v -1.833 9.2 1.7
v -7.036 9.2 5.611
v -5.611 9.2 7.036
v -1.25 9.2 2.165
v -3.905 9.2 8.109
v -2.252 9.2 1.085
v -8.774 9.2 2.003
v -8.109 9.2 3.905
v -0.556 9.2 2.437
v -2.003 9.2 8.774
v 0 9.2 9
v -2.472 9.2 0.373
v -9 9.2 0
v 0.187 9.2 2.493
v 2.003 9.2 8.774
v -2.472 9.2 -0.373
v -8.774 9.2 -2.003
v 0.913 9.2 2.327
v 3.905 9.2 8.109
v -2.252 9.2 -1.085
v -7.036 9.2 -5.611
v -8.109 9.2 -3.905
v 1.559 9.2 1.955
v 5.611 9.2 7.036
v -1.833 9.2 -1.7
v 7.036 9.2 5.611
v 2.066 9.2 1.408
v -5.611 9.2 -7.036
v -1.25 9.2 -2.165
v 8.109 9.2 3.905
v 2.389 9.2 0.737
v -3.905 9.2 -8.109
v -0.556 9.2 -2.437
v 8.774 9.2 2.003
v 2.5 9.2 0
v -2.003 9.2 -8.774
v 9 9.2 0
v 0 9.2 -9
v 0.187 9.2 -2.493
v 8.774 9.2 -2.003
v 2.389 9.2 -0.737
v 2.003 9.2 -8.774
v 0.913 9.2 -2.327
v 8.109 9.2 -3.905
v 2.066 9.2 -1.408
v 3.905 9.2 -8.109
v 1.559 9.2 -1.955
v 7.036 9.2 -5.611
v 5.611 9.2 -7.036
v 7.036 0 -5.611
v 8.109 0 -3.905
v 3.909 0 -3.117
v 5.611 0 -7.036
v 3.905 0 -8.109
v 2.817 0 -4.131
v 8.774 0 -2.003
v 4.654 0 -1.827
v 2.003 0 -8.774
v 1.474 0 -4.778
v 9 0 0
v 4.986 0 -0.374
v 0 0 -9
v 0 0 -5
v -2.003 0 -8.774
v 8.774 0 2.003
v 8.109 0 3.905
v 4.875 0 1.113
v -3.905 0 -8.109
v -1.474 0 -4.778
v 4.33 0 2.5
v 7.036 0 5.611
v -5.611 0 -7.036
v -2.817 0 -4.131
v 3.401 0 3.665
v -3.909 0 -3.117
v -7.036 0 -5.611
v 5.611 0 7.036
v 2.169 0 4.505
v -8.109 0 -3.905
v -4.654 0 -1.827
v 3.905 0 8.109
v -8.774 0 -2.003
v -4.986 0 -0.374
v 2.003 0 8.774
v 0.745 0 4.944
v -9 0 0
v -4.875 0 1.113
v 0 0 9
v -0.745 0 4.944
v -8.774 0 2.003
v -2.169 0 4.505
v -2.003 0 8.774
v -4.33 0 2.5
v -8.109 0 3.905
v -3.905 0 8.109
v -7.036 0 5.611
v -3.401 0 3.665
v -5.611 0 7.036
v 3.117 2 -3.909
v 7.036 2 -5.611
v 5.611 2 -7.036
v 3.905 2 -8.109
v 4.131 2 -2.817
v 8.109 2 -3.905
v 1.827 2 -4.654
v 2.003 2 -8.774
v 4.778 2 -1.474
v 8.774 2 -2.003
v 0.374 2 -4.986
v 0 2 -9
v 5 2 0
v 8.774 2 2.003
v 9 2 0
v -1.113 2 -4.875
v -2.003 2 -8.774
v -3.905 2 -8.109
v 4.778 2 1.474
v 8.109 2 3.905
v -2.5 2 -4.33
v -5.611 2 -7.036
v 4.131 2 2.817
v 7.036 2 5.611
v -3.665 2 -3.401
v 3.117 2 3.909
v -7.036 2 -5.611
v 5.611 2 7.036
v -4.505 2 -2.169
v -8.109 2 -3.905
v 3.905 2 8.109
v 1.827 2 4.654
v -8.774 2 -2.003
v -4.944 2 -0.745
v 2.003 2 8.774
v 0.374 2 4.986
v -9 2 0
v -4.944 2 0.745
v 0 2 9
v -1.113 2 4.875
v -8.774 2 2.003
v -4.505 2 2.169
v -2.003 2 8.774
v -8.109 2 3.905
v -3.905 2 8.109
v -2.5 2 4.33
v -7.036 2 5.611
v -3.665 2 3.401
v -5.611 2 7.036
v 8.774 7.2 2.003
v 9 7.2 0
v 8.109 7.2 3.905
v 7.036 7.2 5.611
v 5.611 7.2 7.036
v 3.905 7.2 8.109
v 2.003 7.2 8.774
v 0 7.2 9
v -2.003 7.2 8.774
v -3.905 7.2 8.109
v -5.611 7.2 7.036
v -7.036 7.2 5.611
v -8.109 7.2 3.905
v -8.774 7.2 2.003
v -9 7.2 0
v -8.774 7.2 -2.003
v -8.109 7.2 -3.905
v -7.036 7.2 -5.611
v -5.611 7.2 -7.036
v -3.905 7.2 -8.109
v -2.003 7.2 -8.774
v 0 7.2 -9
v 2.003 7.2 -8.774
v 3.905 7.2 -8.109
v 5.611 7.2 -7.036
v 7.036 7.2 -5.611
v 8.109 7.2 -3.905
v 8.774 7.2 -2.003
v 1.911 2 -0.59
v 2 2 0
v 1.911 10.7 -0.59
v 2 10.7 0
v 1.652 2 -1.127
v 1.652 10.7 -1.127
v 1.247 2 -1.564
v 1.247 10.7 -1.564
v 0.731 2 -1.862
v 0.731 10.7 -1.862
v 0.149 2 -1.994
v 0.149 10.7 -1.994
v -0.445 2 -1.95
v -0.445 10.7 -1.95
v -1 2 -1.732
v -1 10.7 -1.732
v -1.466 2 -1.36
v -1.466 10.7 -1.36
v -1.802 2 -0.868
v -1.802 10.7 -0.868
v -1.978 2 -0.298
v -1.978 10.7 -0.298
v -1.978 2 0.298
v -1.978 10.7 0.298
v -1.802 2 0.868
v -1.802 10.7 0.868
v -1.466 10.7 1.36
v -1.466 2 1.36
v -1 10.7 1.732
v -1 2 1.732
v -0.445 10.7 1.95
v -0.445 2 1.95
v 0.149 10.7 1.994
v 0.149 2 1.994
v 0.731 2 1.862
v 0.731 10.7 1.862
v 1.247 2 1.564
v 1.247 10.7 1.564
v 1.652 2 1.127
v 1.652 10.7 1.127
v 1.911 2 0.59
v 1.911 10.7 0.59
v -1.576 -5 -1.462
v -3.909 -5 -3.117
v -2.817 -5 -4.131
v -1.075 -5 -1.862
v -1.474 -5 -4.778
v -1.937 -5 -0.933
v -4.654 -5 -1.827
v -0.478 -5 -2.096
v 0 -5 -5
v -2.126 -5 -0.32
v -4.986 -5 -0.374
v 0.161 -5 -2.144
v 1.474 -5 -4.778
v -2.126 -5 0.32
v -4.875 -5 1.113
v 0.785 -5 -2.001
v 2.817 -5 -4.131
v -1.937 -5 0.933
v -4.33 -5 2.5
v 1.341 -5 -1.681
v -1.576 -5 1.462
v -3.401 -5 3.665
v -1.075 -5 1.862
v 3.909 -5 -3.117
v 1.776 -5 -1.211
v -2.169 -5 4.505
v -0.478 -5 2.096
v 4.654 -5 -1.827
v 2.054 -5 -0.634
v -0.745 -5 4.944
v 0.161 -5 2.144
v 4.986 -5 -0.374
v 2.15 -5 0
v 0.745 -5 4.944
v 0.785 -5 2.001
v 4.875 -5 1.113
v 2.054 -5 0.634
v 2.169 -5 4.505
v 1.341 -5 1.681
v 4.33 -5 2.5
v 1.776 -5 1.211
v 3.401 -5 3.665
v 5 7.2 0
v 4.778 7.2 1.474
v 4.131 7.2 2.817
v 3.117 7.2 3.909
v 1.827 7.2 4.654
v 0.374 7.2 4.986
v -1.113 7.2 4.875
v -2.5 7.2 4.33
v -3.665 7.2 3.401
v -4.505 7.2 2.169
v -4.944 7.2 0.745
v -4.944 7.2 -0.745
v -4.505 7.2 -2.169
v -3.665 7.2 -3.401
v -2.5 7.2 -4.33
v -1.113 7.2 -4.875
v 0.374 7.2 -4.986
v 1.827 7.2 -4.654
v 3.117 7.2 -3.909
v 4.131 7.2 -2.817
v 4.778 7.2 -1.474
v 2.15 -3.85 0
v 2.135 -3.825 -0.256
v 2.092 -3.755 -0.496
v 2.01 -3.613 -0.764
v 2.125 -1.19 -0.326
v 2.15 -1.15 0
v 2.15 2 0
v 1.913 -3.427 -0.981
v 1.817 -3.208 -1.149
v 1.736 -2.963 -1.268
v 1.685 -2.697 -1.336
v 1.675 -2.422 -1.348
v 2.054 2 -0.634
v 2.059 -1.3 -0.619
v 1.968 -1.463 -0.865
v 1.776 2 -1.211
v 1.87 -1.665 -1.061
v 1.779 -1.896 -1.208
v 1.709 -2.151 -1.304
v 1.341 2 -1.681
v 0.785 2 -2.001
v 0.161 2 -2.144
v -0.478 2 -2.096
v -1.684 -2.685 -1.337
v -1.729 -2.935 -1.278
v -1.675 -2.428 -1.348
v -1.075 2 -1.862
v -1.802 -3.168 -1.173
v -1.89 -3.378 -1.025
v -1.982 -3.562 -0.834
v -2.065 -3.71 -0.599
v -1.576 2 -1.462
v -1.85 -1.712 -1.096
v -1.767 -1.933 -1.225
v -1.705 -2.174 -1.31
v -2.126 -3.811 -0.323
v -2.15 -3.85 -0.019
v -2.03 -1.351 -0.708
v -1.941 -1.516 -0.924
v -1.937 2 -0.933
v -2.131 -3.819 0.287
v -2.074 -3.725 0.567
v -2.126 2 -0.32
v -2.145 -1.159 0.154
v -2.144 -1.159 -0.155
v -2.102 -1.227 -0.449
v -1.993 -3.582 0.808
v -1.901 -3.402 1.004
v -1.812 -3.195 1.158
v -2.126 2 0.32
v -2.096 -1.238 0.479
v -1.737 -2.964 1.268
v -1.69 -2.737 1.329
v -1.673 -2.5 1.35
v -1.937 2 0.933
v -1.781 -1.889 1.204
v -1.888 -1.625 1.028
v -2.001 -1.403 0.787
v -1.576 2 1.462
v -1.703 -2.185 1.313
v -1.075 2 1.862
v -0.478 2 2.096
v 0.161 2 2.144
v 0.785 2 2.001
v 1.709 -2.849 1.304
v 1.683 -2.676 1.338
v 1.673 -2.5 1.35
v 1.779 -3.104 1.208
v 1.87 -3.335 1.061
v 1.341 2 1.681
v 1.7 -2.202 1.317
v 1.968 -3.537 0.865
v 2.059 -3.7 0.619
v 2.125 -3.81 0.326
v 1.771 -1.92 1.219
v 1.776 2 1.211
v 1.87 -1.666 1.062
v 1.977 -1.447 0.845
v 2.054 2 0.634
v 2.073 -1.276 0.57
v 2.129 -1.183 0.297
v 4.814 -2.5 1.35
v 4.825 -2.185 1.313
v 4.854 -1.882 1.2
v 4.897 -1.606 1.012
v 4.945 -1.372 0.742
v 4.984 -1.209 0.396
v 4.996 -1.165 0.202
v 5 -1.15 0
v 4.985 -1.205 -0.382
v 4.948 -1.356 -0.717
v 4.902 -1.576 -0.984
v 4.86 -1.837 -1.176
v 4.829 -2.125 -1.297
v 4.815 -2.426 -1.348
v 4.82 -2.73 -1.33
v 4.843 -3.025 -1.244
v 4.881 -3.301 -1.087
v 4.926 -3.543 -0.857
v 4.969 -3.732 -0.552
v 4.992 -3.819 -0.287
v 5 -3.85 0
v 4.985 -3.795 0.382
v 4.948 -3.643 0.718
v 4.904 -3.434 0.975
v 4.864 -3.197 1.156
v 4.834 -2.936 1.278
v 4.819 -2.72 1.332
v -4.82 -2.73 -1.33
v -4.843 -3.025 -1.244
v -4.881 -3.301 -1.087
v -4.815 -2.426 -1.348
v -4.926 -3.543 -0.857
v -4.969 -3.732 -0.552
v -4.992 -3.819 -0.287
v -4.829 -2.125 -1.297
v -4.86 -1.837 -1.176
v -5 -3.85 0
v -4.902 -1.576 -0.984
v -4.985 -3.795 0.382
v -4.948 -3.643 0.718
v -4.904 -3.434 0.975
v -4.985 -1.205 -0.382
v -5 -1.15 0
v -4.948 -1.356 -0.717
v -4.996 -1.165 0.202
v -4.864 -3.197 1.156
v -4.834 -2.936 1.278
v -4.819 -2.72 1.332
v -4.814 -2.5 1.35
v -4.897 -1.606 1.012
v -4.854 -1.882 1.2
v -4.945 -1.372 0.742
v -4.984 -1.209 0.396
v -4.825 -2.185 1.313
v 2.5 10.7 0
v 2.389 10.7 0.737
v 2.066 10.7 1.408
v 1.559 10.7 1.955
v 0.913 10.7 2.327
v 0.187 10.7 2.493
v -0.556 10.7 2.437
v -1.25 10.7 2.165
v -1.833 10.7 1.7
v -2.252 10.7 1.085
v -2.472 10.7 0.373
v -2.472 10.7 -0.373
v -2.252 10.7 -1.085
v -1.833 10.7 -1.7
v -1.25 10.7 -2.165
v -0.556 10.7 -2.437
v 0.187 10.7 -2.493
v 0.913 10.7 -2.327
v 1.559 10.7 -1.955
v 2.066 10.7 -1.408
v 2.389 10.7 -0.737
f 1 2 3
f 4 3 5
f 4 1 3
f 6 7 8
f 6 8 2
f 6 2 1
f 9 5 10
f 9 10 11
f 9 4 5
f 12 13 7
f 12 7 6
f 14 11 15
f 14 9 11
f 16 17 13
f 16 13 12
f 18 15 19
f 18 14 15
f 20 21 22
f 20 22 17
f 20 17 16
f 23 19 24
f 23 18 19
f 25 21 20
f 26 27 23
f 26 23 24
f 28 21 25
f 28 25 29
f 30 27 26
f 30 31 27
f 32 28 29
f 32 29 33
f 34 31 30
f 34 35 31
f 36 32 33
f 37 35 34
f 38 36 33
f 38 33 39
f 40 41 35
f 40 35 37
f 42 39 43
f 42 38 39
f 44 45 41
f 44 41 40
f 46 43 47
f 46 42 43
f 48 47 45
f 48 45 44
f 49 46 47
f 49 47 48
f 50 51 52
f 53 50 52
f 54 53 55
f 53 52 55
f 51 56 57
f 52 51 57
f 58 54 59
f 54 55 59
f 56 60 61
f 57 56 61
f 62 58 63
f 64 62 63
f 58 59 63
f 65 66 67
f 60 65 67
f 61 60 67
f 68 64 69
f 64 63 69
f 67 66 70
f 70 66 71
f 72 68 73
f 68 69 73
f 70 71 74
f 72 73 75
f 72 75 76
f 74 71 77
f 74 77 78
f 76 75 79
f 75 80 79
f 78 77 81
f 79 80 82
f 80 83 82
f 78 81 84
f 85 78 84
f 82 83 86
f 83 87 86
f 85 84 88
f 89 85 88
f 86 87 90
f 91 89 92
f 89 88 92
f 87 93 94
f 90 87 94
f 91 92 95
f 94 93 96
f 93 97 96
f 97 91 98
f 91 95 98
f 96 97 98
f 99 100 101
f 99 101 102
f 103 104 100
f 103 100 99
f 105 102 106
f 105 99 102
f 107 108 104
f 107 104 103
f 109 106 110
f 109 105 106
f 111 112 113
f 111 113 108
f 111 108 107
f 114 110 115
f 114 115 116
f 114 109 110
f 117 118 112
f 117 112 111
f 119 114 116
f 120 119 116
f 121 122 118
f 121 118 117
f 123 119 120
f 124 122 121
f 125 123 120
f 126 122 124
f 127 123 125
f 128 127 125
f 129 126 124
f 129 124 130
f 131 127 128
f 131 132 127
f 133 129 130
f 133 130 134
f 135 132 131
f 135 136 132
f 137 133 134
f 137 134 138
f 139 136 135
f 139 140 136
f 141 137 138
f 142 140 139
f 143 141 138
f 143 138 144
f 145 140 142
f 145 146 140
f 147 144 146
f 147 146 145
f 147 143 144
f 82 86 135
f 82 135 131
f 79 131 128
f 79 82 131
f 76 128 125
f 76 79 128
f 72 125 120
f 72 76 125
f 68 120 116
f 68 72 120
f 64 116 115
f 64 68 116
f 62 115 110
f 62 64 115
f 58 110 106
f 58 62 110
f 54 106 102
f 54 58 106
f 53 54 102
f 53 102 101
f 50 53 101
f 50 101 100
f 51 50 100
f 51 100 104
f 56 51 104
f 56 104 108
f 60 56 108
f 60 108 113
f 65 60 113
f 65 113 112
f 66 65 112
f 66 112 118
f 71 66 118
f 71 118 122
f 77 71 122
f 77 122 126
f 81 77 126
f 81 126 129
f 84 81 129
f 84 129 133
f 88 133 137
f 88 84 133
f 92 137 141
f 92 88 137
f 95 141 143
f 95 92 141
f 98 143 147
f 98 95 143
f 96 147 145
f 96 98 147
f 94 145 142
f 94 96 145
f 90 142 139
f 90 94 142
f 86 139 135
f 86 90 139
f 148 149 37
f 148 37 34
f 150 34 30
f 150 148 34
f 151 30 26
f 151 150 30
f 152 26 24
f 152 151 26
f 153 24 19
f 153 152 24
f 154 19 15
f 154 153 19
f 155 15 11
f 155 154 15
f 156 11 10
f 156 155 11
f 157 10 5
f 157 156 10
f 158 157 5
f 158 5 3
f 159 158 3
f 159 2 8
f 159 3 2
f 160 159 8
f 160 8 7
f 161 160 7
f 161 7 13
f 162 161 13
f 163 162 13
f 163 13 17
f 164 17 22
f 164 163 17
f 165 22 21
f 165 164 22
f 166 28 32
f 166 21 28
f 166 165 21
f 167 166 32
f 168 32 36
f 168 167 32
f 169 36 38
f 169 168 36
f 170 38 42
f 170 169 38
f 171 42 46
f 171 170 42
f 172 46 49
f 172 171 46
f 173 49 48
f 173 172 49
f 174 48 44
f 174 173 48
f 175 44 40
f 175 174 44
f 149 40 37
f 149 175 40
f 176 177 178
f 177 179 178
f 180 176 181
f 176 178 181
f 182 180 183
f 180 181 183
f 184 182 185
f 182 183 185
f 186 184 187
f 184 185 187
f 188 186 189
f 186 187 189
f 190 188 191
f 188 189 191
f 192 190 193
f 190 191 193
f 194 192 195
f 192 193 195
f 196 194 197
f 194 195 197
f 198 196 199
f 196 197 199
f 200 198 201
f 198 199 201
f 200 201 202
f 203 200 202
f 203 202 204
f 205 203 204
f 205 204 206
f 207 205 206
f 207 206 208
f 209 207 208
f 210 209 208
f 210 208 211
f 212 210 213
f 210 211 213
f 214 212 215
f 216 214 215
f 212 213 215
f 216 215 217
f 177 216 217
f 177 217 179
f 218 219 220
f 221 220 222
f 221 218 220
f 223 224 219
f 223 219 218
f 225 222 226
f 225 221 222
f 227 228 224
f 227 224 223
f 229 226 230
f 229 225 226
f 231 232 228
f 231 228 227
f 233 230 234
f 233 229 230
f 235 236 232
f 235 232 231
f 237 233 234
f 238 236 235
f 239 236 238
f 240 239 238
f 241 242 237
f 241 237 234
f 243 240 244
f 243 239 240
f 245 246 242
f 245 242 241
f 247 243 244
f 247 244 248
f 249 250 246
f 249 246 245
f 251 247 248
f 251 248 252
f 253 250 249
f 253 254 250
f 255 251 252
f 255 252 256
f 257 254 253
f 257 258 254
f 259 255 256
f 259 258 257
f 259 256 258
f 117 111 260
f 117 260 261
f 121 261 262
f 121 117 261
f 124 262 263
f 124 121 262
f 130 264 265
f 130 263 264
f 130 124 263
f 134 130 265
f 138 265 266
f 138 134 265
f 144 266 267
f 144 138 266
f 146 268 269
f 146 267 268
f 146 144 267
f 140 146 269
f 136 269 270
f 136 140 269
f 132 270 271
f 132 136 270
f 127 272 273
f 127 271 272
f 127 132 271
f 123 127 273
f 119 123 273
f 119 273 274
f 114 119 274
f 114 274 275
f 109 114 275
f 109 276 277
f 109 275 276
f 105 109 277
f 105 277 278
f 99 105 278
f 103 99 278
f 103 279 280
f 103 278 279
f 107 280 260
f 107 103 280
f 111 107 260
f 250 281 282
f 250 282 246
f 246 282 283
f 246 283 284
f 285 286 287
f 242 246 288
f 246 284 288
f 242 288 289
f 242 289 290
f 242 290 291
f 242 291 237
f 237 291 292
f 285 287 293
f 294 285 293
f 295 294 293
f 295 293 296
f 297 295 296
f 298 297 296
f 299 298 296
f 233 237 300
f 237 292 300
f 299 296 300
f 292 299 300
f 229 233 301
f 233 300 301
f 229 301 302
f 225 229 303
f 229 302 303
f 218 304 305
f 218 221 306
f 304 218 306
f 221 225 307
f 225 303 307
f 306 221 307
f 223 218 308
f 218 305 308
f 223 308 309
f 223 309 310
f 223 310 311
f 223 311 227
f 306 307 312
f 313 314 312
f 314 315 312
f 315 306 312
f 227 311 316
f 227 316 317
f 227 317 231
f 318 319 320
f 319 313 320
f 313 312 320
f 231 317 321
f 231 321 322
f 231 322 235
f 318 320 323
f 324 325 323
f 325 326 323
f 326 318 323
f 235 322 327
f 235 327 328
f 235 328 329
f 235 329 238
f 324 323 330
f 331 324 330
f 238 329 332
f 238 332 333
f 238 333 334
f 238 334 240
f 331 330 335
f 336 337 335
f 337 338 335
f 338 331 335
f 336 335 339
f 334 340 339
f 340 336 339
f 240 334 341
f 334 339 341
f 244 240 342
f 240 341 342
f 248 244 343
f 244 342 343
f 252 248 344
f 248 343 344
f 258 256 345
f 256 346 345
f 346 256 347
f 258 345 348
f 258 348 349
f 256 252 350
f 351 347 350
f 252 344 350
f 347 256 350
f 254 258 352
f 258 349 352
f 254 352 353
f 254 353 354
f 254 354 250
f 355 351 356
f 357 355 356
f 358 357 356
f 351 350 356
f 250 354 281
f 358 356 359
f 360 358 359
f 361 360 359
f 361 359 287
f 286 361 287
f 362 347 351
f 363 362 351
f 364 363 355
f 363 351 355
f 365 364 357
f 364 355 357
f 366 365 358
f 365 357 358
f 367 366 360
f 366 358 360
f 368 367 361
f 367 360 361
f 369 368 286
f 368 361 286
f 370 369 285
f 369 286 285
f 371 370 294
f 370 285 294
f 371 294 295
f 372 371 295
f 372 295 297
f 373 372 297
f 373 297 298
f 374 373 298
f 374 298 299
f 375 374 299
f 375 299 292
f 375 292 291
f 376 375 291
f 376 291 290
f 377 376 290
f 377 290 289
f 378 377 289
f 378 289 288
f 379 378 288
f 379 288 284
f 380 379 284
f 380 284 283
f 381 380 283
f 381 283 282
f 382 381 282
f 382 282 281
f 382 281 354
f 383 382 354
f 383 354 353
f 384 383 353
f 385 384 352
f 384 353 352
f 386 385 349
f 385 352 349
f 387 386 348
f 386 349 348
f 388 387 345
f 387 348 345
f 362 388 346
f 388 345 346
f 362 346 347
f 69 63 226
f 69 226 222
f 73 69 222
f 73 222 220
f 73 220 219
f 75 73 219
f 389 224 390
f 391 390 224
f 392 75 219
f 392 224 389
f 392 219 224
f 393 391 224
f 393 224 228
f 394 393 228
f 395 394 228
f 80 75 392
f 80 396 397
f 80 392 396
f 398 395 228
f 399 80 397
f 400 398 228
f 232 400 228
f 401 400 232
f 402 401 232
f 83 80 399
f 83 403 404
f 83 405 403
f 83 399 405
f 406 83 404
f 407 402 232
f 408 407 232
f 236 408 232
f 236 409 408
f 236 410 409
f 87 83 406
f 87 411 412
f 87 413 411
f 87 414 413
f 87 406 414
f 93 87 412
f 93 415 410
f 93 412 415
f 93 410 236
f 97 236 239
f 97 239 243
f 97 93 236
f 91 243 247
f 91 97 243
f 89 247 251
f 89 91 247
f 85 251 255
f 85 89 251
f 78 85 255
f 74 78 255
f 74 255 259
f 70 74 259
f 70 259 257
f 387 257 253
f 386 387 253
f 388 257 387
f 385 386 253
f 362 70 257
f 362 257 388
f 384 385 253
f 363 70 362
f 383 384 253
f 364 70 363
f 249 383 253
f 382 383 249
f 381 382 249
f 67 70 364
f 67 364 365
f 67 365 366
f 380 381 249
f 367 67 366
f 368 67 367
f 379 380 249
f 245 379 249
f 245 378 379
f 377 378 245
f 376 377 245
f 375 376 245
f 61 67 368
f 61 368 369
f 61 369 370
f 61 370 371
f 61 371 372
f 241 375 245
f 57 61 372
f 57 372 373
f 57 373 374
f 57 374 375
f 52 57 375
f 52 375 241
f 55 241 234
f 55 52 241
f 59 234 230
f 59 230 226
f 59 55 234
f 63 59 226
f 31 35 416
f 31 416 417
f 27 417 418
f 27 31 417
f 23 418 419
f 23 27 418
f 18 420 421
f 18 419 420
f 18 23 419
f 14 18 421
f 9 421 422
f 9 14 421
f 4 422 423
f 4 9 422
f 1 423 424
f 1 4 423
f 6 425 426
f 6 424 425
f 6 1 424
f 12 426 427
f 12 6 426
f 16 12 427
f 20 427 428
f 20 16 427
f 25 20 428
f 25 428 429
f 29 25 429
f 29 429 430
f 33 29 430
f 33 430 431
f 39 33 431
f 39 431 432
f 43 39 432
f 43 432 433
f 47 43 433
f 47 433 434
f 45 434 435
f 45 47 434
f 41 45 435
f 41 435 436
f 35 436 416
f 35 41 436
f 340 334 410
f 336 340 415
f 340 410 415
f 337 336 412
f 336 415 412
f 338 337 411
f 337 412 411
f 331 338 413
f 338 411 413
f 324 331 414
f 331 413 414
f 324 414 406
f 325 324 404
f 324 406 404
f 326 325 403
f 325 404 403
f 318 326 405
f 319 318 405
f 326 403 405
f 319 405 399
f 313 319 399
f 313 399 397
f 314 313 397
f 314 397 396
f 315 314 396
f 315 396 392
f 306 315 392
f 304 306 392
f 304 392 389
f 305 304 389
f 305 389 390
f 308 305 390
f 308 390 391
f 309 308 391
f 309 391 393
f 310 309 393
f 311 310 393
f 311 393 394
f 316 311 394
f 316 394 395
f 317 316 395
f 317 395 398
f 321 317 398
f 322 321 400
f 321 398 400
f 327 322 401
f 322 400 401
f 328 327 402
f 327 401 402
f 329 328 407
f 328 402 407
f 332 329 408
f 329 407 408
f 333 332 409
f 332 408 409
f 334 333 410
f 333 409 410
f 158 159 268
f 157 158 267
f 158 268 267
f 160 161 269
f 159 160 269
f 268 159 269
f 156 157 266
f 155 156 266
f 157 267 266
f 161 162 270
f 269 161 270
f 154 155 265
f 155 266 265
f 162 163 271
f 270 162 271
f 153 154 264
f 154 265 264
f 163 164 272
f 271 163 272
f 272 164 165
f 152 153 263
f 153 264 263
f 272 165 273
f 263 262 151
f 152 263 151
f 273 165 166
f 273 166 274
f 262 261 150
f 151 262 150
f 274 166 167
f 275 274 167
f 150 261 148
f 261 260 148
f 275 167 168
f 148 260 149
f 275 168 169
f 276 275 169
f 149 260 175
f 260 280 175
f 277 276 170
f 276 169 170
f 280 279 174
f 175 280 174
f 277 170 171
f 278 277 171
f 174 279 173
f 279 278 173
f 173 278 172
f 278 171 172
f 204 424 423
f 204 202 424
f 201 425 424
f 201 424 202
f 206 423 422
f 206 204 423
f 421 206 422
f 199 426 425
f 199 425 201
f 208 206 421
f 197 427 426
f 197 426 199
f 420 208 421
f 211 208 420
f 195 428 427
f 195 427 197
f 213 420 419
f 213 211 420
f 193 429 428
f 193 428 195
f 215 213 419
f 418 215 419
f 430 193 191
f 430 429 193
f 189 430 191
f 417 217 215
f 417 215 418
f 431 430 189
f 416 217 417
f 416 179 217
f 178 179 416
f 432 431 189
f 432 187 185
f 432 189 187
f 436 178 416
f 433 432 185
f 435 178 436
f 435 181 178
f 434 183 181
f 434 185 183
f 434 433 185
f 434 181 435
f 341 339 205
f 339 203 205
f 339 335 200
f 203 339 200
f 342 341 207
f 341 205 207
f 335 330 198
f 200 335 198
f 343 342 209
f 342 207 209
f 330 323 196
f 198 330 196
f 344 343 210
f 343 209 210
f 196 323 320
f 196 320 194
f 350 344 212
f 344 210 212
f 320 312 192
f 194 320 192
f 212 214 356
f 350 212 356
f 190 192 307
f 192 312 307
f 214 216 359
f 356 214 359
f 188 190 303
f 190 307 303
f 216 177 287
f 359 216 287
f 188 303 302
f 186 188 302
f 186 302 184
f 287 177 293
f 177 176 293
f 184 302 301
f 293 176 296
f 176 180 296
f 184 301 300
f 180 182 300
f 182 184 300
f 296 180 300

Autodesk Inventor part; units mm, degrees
ref_plane "YZ Plane" through (0, 0, 0) normal (1, 0, 0) x (0, 1, 0)
ref_plane "XZ Plane" through (0, 0, 0) normal (0, 1, 0) x (-1, 0, 0)
ref_plane "XY Plane" through (0, 0, 0) normal (0, 0, 1) x (1, 0, 0)
sketch "Эскиз1" plane through (0, 0, 0) normal (0, 1, 0) x (-1, 0, 0)
  circle A0 centre (0, 0) radius 9
  dimension "d0" = 18
extrude "Выдавливание1" add sketch "Эскиз1" along normal blind 2
sketch "Эскиз5" plane through (0, 0, 0) normal (0, -1, 0) x (1, 0, 0)
  line L0 (5, -5) -> (-5, -5)
  line L1 (-5, -5) -> (-5, 5)
  line L2 (-5, 5) -> (5, 5)
  line L3 (5, 5) -> (5, -5)
  circle A0 centre (0, 0) radius 2
  dimension "d12" = 10
  dimension "d13" = 10
  dimension "d17" = 5
  dimension "d27" = 5
extrude "Выдавливание5" add sketch "Эскиз5" along normal blind 5
sketch "Эскиз6" plane through (-5, 0, -5) normal (-1, 0, 0) x (0, 0, 1)
  circle A0 centre (5, -2.5) radius 1.35
  line L0 (10, -5) -> (0, -5) projected
  line L1 (0, 0) -> (0, -5) projected
  point P0 (5, 0)
  point P1 (0, -2.5)
  dimension "d30" = 2.7
  dimension "d31" = 2.5
  dimension "d32" = 5
extrude "Выдавливание6" cut sketch "Эскиз6" against normal blind 15.75
fillet "Сопряжение1" radius 5 4 edges at (5, -2.5, 5) (-5, -2.5, 5) (-5, -2.5, -5) (5, -2.5, -5)
sketch "Эскиз8" plane through (0, 0, 0) normal (0, -1, 0) x (1, 0, 0)
  point P0 (0, 0)
sketch "Эскиз9" plane through (0, 2, 0) normal (0, 1, 0) x (1, 0, 0)
  circle A0 centre (0, 0) radius 2.15
  dimension "d44" = 4.3
extrude "Выдавливание8" cut sketch "Эскиз9" against normal blind 10
sketch "Эскиз11" plane through (0, 2, 0) normal (0, 1, 0) x (1, 0, 0)
  circle A0 centre (0, 0) radius 5
  dimension "d47" = 10
extrude "Выдавливание9" add sketch "Эскиз11" along normal blind 5.2
sketch "Эскиз12" plane through (0, 7.2, 0) normal (0, 1, 0) x (1, 0, 0)
  circle A0 centre (0, 0) radius 9
  dimension "d50" = 18
extrude "Выдавливание10" add sketch "Эскиз12" along normal blind 2
sketch "Эскиз13" plane through (0, 9.2, 0) normal (0, 1, 0) x (1, 0, 0)
  circle A0 centre (0, 0) radius 2
  dimension "d53" = 4
extrude "Выдавливание11" cut sketch "Эскиз13" against normal blind 17.75
sketch "Эскиз14" plane through (0, 9.2, 0) normal (0, 1, 0) x (1, 0, 0)
  circle A0 centre (0, 0) radius 2.5
  dimension "d56" = 5
extrude "Выдавливание12" add sketch "Эскиз14" along normal blind 1.5
sketch "Эскиз15" plane through (0, 10.7, 0) normal (0, 1, 0) x (1, 0, 0)
  circle A0 centre (0, 0) radius 2
  dimension "d59" = 4
extrude "Выдавливание13" cut sketch "Эскиз15" against normal blind 33.5
properties part number "koleso_rig"
